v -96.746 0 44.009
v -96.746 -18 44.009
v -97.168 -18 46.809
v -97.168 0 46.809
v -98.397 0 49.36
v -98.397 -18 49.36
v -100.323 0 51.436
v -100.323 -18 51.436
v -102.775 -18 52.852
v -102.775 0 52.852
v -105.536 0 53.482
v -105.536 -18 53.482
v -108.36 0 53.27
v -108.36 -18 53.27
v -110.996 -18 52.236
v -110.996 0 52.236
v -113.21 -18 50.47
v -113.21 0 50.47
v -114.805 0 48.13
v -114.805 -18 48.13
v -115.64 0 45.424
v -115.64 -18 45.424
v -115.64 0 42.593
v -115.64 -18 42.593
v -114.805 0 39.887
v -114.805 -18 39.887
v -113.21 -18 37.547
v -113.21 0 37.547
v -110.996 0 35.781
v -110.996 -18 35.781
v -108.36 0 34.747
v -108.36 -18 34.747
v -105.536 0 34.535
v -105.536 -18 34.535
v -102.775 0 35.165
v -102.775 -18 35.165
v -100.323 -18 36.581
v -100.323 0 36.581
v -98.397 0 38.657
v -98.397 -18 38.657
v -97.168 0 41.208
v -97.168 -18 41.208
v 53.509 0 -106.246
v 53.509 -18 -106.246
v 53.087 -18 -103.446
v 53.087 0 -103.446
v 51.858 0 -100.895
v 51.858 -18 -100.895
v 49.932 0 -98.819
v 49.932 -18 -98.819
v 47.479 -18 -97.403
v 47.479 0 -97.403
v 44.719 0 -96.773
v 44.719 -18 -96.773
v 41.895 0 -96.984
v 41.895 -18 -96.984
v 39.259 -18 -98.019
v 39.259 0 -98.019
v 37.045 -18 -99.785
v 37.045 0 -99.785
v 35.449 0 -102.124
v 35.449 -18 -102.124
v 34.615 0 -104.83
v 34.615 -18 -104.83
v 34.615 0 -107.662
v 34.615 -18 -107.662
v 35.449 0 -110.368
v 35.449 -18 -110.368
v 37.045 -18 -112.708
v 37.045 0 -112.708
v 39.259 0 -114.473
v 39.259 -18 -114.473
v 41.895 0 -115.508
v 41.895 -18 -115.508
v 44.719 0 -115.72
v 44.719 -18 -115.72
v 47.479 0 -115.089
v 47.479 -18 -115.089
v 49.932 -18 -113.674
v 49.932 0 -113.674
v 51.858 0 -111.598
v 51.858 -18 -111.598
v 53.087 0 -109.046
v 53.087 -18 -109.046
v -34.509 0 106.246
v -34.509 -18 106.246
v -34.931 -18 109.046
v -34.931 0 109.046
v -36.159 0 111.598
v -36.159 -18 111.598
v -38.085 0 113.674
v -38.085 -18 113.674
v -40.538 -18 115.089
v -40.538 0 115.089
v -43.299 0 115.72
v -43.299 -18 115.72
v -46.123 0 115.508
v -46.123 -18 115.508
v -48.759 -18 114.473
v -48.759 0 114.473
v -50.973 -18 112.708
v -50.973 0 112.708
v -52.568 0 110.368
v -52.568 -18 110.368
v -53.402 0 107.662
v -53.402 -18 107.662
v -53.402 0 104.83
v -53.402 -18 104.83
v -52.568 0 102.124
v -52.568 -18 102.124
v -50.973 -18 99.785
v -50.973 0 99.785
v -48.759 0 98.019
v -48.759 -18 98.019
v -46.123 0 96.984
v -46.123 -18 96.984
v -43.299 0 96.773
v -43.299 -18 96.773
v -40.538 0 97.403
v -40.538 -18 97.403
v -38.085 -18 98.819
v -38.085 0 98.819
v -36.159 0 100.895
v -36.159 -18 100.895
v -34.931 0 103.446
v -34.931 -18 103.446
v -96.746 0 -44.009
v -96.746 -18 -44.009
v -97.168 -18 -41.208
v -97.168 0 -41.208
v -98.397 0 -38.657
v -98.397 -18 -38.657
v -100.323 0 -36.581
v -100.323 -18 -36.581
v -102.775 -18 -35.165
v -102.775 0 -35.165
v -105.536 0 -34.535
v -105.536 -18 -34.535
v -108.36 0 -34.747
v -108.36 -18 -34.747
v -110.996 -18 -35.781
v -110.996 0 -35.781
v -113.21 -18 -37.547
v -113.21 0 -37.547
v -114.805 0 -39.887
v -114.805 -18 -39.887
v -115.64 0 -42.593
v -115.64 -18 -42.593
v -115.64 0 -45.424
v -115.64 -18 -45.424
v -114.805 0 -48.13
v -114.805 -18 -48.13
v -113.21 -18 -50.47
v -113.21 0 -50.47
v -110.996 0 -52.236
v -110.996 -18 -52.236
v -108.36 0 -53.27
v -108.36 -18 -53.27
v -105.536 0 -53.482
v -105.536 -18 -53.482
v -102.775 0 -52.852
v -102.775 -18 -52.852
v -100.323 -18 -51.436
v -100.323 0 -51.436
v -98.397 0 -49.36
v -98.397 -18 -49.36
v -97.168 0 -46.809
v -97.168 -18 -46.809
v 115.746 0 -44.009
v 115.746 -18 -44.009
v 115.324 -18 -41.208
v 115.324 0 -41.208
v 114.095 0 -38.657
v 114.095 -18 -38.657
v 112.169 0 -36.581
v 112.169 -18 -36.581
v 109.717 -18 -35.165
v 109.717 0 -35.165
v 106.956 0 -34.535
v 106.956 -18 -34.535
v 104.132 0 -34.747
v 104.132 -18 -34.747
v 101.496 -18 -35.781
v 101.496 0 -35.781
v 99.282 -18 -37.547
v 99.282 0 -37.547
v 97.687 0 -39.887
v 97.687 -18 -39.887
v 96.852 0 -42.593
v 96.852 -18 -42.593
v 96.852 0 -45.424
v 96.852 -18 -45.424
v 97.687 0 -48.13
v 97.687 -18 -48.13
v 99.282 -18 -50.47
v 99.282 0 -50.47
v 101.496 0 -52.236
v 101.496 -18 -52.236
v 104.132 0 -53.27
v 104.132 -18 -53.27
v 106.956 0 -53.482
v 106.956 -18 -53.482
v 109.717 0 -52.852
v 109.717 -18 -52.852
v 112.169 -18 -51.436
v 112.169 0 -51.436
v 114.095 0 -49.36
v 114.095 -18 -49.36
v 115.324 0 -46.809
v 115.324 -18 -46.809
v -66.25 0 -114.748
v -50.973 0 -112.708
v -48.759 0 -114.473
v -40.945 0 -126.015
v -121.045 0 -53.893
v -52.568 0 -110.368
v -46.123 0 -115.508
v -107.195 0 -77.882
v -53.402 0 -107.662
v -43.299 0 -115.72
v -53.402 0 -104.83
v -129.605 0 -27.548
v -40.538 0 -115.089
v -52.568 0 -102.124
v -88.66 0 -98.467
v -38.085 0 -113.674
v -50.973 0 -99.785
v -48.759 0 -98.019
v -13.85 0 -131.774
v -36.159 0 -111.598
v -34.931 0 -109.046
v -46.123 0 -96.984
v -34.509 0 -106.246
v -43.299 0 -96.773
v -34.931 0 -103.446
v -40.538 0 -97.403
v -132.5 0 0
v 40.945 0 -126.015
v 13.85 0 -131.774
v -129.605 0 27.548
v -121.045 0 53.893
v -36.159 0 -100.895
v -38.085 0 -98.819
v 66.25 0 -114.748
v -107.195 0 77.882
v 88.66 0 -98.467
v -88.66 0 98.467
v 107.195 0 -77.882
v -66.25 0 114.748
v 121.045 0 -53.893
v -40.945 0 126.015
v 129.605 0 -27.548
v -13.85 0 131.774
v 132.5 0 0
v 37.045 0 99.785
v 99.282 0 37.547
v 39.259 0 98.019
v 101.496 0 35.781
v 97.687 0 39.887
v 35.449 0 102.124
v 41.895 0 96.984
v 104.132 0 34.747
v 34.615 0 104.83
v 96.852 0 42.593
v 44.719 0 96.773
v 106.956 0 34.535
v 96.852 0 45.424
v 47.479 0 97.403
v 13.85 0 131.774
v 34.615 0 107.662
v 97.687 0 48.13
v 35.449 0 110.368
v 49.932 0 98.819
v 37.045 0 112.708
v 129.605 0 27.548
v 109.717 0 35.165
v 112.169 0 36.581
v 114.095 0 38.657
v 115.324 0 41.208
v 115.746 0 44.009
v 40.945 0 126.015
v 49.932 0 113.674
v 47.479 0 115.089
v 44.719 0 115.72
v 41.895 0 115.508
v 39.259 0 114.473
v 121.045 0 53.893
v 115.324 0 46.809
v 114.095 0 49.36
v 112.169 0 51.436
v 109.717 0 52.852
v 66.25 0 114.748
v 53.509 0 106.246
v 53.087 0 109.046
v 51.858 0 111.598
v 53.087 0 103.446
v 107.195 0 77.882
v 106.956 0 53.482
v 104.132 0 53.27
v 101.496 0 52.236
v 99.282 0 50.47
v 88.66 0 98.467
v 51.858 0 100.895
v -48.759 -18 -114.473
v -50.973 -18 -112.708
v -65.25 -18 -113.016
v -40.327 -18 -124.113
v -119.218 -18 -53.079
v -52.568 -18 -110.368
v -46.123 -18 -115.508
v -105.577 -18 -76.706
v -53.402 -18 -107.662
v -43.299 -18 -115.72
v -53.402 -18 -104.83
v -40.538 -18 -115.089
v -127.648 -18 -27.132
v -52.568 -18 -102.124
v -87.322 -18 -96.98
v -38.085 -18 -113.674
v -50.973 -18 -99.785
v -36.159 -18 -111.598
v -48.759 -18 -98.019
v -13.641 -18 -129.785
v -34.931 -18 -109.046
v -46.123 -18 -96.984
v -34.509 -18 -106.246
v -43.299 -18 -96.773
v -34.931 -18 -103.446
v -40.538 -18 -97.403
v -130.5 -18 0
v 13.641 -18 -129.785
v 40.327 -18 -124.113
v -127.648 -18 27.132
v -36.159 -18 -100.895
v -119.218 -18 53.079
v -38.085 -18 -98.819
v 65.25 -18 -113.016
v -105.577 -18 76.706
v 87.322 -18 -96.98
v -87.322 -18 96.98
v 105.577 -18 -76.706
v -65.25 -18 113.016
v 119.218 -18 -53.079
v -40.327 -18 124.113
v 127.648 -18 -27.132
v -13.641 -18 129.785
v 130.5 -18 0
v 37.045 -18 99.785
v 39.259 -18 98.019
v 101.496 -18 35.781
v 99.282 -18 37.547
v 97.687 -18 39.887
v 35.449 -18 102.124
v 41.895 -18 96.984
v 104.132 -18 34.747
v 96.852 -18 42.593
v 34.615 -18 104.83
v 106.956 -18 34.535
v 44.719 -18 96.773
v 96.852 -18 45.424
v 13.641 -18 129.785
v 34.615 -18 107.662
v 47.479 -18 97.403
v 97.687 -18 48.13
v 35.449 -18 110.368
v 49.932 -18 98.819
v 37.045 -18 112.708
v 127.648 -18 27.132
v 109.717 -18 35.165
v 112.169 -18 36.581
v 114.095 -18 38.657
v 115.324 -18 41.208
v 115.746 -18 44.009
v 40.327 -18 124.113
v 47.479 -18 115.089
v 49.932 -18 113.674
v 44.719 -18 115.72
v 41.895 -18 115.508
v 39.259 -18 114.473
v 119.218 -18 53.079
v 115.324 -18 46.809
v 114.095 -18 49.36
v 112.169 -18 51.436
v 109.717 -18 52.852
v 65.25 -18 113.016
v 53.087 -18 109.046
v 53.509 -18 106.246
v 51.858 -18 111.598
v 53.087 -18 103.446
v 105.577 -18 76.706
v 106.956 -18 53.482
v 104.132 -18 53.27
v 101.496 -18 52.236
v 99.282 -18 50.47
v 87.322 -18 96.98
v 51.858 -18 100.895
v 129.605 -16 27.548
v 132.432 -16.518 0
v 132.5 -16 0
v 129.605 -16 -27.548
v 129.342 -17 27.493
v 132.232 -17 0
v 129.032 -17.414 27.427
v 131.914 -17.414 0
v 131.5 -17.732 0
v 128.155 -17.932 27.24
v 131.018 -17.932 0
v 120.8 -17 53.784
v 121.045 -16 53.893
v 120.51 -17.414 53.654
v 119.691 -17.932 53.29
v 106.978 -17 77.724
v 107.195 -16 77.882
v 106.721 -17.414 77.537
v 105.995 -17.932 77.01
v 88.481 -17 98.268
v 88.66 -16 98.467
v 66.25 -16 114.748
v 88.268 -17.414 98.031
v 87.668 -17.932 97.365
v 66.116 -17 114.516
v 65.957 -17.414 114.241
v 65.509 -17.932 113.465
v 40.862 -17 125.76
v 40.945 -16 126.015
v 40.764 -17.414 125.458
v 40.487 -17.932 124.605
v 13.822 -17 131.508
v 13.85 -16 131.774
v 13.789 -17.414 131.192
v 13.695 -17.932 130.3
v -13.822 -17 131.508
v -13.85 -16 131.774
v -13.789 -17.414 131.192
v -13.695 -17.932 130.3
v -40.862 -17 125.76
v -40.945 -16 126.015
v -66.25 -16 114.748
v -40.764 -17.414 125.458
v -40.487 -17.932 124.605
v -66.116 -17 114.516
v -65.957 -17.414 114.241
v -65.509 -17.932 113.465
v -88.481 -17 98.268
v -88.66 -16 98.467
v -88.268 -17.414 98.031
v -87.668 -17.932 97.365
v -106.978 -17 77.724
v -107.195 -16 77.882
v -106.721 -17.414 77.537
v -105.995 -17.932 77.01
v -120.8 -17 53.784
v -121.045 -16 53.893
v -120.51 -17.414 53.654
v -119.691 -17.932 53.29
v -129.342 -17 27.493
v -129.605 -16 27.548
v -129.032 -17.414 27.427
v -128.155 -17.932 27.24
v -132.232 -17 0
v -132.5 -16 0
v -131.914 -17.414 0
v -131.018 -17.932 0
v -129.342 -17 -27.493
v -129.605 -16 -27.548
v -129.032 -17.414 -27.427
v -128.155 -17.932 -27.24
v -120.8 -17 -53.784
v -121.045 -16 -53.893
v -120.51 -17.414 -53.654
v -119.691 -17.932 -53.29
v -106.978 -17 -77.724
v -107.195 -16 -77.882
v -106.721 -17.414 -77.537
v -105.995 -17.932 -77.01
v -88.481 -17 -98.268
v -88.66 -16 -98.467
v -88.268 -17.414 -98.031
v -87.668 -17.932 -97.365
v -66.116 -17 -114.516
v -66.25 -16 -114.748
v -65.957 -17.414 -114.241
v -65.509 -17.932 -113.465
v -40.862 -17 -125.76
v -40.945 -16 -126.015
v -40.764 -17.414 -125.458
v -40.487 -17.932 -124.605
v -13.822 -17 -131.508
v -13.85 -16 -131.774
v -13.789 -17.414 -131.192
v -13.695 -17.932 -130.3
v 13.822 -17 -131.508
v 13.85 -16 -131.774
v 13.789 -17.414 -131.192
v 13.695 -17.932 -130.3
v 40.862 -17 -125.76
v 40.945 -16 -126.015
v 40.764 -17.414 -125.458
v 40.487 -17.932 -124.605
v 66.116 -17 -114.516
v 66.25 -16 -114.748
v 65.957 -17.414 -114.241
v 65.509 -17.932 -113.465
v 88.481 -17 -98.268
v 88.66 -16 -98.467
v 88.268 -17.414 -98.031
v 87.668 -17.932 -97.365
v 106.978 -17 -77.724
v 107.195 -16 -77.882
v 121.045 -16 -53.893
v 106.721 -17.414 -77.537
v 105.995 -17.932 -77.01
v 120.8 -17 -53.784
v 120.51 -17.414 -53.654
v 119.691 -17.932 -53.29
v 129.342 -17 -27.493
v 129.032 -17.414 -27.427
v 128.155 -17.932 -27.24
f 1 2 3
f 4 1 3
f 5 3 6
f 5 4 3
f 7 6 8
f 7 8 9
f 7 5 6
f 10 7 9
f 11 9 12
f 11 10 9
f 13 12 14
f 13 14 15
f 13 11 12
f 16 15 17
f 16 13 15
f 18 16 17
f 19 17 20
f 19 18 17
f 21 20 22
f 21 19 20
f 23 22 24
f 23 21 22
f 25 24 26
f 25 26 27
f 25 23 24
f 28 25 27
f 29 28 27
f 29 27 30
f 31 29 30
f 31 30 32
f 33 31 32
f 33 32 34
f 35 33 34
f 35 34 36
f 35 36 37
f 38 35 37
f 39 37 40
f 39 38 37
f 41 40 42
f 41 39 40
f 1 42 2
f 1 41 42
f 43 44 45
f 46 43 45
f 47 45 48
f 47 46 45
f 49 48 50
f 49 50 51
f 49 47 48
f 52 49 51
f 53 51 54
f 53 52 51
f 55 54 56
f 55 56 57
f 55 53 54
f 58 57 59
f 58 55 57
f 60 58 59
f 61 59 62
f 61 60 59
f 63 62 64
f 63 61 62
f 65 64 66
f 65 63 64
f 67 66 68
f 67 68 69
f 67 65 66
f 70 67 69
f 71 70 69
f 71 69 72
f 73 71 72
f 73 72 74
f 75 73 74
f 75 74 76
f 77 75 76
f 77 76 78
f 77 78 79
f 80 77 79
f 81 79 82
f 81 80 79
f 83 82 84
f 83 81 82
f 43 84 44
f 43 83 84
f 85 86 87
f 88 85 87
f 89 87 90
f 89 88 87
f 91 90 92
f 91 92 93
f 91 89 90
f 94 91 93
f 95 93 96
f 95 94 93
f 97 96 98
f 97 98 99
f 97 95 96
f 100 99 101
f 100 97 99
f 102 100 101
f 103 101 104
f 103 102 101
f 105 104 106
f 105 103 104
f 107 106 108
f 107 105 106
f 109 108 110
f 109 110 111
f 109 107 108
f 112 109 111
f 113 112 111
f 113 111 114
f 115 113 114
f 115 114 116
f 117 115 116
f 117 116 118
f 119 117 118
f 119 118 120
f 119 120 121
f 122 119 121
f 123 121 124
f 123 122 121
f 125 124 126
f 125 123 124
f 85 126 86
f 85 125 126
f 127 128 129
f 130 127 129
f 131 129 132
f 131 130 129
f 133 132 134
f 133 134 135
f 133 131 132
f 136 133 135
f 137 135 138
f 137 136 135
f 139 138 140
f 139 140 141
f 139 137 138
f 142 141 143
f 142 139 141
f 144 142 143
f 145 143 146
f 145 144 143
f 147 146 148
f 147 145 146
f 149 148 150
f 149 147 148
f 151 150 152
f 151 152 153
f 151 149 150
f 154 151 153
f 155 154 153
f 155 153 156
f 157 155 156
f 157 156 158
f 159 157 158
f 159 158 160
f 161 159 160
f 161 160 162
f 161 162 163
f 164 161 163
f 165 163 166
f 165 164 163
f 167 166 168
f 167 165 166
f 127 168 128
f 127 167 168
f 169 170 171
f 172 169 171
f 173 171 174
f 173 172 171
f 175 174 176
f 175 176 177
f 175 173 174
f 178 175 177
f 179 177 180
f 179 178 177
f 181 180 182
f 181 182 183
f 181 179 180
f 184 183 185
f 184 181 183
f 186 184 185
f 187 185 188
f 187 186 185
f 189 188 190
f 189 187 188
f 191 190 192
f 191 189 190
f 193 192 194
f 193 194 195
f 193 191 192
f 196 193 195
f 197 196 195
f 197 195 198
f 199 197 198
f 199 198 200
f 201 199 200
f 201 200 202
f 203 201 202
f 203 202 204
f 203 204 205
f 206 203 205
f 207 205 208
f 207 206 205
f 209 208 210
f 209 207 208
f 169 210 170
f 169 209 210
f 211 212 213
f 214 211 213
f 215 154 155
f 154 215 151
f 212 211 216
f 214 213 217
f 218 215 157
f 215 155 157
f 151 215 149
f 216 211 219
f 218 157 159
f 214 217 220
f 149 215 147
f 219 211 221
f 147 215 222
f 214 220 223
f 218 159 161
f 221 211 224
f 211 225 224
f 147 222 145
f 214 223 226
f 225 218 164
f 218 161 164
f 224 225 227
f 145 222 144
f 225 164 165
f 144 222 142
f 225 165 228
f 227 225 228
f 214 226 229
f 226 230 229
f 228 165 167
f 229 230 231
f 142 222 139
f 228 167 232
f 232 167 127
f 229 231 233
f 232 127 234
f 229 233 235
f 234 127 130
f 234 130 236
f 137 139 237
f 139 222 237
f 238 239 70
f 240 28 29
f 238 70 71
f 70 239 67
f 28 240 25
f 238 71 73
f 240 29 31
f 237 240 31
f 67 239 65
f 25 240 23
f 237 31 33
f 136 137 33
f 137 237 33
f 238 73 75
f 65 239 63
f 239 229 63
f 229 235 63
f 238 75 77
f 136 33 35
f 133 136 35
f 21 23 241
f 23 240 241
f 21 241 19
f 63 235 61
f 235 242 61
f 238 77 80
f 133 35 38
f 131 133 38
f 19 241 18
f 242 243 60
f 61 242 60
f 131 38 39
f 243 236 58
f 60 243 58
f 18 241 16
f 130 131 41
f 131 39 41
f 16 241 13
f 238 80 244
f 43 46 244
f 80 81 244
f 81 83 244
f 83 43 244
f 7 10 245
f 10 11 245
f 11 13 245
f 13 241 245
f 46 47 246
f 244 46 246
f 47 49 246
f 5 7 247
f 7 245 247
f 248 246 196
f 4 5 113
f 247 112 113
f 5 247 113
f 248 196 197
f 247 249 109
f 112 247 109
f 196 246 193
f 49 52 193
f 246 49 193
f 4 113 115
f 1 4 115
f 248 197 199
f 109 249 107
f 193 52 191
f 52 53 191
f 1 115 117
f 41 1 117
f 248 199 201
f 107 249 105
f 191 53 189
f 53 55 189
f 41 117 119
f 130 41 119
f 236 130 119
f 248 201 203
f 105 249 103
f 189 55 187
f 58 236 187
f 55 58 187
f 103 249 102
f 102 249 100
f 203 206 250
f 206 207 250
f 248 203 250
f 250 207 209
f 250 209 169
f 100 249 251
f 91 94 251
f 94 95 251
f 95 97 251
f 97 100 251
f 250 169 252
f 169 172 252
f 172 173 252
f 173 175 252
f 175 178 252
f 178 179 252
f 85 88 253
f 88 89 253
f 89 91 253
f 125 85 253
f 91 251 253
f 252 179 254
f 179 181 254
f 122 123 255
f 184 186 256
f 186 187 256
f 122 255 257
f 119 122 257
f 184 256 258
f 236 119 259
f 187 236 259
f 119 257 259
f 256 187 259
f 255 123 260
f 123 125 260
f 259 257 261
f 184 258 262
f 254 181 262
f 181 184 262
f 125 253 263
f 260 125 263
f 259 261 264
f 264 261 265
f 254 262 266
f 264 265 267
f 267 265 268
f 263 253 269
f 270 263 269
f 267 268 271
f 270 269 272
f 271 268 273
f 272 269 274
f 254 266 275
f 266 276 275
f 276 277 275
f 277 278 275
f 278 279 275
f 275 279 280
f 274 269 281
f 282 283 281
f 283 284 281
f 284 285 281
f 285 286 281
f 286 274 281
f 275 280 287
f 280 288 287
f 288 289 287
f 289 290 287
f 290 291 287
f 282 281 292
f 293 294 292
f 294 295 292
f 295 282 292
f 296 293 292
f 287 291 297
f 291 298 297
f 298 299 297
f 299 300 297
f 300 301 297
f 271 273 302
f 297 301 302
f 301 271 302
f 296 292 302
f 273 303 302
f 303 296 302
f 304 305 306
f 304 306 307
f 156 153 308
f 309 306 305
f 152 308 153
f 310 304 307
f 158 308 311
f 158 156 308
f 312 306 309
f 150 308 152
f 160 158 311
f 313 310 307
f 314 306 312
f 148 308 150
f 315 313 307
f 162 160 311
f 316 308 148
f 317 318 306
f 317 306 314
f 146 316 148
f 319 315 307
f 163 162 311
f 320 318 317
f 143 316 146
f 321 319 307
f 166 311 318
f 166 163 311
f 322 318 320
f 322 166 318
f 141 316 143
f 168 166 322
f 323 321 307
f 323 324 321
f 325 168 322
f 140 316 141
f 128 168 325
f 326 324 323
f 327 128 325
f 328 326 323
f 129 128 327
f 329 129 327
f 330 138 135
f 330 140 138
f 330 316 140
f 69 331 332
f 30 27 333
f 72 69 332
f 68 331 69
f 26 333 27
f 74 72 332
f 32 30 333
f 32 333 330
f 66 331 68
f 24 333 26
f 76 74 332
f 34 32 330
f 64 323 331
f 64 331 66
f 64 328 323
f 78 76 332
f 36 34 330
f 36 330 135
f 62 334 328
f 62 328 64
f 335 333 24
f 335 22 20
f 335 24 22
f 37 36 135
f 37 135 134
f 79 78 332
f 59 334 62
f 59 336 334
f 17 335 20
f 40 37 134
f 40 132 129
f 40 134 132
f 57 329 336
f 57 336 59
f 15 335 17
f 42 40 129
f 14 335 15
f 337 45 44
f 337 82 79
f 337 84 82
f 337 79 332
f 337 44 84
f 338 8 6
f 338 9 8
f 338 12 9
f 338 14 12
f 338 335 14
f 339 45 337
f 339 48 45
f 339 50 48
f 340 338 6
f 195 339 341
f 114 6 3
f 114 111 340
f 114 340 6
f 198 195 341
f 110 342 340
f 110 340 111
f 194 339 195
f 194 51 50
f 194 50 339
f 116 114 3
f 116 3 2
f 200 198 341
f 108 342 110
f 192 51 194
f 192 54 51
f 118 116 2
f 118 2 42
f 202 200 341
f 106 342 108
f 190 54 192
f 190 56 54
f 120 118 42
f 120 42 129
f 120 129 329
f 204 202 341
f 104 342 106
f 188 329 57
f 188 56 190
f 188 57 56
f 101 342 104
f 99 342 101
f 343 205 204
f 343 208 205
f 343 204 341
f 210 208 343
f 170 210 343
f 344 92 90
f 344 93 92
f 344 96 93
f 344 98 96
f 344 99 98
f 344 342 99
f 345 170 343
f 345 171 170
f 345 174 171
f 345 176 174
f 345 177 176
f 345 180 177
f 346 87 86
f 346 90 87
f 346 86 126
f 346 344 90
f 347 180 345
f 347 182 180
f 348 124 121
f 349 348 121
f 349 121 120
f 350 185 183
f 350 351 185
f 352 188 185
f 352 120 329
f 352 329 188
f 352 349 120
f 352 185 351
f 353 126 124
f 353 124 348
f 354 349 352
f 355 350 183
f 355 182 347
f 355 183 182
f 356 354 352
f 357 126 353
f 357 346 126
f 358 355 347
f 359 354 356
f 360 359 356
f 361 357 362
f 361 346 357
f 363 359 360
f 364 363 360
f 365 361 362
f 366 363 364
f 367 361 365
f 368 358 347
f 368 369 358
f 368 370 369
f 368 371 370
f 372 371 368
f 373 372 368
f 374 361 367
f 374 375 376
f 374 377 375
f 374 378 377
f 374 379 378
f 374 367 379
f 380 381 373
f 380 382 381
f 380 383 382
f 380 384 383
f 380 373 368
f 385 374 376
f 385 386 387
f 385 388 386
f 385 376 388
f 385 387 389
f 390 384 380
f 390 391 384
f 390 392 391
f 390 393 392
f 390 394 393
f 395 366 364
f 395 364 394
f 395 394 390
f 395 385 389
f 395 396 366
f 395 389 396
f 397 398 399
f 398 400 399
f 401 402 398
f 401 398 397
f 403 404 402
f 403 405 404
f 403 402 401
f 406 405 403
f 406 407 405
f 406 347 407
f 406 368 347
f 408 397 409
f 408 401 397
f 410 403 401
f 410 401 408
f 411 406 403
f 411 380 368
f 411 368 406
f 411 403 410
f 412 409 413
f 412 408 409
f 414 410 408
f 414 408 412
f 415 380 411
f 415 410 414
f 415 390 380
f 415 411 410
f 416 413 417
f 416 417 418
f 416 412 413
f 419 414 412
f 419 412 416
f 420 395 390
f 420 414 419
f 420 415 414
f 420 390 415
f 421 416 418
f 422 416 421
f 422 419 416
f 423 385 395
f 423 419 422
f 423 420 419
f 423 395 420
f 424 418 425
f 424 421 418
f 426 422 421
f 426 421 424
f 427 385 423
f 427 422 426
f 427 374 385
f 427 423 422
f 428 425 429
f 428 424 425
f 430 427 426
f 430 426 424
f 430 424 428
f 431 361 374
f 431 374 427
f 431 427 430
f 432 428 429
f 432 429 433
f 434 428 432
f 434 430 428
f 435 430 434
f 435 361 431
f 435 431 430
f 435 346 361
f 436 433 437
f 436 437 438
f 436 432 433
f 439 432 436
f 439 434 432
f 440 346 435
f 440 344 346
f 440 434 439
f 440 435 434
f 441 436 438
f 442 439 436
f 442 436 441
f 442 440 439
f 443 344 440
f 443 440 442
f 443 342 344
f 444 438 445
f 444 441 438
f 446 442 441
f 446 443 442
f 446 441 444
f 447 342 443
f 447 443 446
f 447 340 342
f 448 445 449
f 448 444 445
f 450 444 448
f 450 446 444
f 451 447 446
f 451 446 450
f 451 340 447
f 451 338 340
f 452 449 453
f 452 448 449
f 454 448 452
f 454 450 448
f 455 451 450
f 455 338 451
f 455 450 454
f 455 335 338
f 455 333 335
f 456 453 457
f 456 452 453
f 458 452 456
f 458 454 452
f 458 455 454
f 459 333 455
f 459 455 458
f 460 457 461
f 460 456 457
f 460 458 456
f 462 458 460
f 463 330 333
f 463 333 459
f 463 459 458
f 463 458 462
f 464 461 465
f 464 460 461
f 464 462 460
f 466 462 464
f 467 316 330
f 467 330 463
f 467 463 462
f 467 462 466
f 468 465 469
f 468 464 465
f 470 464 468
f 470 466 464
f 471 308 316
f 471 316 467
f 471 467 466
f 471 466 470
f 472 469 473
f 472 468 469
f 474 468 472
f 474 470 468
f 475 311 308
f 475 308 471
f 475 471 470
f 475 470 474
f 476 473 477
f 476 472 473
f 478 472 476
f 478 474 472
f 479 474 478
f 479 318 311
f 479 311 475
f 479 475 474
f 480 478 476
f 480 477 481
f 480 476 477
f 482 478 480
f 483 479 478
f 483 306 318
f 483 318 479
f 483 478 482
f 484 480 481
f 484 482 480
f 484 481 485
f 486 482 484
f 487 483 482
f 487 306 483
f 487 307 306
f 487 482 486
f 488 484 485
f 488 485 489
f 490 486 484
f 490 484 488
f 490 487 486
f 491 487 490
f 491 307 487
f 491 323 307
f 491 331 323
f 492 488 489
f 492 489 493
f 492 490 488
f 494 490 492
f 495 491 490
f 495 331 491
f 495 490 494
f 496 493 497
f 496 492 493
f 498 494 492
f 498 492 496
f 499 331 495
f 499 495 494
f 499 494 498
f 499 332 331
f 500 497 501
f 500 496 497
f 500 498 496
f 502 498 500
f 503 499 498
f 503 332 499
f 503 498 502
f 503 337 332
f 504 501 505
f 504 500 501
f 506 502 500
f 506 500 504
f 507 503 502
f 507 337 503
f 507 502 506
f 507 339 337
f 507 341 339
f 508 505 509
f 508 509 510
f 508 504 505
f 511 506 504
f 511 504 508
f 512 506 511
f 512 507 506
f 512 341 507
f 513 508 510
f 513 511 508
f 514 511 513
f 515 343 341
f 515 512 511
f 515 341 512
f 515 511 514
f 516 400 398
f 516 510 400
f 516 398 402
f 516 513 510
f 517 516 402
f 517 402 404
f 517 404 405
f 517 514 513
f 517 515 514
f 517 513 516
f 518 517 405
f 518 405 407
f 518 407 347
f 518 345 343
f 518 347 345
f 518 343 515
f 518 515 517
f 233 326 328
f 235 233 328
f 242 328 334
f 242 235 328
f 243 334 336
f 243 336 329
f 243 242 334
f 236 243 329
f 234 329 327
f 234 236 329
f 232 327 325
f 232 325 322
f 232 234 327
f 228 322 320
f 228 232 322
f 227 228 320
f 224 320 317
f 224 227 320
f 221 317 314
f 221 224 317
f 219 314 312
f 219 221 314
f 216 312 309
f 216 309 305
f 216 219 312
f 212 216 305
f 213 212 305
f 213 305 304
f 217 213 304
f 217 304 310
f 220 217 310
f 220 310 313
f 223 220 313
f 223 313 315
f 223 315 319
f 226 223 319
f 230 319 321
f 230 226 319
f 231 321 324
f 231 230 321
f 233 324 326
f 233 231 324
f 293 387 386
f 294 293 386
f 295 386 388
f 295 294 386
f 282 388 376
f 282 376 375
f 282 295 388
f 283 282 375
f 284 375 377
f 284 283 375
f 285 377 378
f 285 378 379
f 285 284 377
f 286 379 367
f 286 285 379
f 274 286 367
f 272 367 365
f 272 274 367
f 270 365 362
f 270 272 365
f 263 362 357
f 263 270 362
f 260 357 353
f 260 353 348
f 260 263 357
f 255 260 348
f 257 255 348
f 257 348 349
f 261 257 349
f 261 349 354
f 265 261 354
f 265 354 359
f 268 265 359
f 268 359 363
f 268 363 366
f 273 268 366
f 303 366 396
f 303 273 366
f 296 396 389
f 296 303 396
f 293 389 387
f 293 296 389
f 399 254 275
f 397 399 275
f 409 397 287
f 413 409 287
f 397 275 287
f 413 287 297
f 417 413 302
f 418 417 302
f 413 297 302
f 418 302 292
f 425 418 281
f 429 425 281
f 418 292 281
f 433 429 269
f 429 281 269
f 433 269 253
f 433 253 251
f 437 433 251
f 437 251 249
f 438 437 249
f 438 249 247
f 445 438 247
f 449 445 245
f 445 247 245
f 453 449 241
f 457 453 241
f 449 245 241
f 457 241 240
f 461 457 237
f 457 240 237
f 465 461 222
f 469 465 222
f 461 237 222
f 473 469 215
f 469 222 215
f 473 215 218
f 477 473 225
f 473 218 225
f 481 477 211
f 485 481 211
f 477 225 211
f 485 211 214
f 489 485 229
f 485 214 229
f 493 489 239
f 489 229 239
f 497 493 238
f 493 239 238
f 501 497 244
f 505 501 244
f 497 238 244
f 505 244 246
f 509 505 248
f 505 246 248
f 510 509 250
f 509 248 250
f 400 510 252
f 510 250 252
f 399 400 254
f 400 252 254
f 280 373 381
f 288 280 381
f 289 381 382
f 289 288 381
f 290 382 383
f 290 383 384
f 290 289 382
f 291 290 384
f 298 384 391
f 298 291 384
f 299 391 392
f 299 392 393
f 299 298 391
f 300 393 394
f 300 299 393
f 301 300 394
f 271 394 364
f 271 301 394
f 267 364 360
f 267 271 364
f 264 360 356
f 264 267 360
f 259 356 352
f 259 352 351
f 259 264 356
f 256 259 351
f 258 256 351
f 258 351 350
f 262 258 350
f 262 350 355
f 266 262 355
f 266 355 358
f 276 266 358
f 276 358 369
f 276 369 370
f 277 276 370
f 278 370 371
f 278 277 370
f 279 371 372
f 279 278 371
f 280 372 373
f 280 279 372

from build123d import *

# Parameters (mm, degrees)
F0_R     = 132.5
F0_R_2   = 9.5
F1_DEPTH = 18
F2_R     = 2


with BuildPart() as f1:
    # F0 (on Front) → F1 (new body)
    with BuildSketch(Plane.XZ):
        Circle(F0_R)
        with Locations((-44.008595, -106.246146)):
            Circle(F0_R_2, mode=Mode.SUBTRACT)
        with Locations((-106.246146, -44.008595)):
            Circle(F0_R_2, mode=Mode.SUBTRACT)
        with Locations((44.008595, -106.246146)):
            Circle(F0_R_2, mode=Mode.SUBTRACT)
        with Locations((106.246146, -44.008595)):
            Circle(F0_R_2, mode=Mode.SUBTRACT)
        with Locations((-106.246146, 44.008595)):
            Circle(F0_R_2, mode=Mode.SUBTRACT)
        with Locations((-44.008595, 106.246146)):
            Circle(F0_R_2, mode=Mode.SUBTRACT)
        with Locations((106.246146, 44.008595)):
            Circle(F0_R_2, mode=Mode.SUBTRACT)
        with Locations((44.008595, 106.246146)):
            Circle(F0_R_2, mode=Mode.SUBTRACT)
    extrude(amount=F1_DEPTH)

    # F2
    f2_edges = [f1.edges().sort_by_distance(p)[0] for p in [
        (-132.5, -18, 0),
    ]]
    fillet(f2_edges, radius=F2_R)


solid = f1.part
